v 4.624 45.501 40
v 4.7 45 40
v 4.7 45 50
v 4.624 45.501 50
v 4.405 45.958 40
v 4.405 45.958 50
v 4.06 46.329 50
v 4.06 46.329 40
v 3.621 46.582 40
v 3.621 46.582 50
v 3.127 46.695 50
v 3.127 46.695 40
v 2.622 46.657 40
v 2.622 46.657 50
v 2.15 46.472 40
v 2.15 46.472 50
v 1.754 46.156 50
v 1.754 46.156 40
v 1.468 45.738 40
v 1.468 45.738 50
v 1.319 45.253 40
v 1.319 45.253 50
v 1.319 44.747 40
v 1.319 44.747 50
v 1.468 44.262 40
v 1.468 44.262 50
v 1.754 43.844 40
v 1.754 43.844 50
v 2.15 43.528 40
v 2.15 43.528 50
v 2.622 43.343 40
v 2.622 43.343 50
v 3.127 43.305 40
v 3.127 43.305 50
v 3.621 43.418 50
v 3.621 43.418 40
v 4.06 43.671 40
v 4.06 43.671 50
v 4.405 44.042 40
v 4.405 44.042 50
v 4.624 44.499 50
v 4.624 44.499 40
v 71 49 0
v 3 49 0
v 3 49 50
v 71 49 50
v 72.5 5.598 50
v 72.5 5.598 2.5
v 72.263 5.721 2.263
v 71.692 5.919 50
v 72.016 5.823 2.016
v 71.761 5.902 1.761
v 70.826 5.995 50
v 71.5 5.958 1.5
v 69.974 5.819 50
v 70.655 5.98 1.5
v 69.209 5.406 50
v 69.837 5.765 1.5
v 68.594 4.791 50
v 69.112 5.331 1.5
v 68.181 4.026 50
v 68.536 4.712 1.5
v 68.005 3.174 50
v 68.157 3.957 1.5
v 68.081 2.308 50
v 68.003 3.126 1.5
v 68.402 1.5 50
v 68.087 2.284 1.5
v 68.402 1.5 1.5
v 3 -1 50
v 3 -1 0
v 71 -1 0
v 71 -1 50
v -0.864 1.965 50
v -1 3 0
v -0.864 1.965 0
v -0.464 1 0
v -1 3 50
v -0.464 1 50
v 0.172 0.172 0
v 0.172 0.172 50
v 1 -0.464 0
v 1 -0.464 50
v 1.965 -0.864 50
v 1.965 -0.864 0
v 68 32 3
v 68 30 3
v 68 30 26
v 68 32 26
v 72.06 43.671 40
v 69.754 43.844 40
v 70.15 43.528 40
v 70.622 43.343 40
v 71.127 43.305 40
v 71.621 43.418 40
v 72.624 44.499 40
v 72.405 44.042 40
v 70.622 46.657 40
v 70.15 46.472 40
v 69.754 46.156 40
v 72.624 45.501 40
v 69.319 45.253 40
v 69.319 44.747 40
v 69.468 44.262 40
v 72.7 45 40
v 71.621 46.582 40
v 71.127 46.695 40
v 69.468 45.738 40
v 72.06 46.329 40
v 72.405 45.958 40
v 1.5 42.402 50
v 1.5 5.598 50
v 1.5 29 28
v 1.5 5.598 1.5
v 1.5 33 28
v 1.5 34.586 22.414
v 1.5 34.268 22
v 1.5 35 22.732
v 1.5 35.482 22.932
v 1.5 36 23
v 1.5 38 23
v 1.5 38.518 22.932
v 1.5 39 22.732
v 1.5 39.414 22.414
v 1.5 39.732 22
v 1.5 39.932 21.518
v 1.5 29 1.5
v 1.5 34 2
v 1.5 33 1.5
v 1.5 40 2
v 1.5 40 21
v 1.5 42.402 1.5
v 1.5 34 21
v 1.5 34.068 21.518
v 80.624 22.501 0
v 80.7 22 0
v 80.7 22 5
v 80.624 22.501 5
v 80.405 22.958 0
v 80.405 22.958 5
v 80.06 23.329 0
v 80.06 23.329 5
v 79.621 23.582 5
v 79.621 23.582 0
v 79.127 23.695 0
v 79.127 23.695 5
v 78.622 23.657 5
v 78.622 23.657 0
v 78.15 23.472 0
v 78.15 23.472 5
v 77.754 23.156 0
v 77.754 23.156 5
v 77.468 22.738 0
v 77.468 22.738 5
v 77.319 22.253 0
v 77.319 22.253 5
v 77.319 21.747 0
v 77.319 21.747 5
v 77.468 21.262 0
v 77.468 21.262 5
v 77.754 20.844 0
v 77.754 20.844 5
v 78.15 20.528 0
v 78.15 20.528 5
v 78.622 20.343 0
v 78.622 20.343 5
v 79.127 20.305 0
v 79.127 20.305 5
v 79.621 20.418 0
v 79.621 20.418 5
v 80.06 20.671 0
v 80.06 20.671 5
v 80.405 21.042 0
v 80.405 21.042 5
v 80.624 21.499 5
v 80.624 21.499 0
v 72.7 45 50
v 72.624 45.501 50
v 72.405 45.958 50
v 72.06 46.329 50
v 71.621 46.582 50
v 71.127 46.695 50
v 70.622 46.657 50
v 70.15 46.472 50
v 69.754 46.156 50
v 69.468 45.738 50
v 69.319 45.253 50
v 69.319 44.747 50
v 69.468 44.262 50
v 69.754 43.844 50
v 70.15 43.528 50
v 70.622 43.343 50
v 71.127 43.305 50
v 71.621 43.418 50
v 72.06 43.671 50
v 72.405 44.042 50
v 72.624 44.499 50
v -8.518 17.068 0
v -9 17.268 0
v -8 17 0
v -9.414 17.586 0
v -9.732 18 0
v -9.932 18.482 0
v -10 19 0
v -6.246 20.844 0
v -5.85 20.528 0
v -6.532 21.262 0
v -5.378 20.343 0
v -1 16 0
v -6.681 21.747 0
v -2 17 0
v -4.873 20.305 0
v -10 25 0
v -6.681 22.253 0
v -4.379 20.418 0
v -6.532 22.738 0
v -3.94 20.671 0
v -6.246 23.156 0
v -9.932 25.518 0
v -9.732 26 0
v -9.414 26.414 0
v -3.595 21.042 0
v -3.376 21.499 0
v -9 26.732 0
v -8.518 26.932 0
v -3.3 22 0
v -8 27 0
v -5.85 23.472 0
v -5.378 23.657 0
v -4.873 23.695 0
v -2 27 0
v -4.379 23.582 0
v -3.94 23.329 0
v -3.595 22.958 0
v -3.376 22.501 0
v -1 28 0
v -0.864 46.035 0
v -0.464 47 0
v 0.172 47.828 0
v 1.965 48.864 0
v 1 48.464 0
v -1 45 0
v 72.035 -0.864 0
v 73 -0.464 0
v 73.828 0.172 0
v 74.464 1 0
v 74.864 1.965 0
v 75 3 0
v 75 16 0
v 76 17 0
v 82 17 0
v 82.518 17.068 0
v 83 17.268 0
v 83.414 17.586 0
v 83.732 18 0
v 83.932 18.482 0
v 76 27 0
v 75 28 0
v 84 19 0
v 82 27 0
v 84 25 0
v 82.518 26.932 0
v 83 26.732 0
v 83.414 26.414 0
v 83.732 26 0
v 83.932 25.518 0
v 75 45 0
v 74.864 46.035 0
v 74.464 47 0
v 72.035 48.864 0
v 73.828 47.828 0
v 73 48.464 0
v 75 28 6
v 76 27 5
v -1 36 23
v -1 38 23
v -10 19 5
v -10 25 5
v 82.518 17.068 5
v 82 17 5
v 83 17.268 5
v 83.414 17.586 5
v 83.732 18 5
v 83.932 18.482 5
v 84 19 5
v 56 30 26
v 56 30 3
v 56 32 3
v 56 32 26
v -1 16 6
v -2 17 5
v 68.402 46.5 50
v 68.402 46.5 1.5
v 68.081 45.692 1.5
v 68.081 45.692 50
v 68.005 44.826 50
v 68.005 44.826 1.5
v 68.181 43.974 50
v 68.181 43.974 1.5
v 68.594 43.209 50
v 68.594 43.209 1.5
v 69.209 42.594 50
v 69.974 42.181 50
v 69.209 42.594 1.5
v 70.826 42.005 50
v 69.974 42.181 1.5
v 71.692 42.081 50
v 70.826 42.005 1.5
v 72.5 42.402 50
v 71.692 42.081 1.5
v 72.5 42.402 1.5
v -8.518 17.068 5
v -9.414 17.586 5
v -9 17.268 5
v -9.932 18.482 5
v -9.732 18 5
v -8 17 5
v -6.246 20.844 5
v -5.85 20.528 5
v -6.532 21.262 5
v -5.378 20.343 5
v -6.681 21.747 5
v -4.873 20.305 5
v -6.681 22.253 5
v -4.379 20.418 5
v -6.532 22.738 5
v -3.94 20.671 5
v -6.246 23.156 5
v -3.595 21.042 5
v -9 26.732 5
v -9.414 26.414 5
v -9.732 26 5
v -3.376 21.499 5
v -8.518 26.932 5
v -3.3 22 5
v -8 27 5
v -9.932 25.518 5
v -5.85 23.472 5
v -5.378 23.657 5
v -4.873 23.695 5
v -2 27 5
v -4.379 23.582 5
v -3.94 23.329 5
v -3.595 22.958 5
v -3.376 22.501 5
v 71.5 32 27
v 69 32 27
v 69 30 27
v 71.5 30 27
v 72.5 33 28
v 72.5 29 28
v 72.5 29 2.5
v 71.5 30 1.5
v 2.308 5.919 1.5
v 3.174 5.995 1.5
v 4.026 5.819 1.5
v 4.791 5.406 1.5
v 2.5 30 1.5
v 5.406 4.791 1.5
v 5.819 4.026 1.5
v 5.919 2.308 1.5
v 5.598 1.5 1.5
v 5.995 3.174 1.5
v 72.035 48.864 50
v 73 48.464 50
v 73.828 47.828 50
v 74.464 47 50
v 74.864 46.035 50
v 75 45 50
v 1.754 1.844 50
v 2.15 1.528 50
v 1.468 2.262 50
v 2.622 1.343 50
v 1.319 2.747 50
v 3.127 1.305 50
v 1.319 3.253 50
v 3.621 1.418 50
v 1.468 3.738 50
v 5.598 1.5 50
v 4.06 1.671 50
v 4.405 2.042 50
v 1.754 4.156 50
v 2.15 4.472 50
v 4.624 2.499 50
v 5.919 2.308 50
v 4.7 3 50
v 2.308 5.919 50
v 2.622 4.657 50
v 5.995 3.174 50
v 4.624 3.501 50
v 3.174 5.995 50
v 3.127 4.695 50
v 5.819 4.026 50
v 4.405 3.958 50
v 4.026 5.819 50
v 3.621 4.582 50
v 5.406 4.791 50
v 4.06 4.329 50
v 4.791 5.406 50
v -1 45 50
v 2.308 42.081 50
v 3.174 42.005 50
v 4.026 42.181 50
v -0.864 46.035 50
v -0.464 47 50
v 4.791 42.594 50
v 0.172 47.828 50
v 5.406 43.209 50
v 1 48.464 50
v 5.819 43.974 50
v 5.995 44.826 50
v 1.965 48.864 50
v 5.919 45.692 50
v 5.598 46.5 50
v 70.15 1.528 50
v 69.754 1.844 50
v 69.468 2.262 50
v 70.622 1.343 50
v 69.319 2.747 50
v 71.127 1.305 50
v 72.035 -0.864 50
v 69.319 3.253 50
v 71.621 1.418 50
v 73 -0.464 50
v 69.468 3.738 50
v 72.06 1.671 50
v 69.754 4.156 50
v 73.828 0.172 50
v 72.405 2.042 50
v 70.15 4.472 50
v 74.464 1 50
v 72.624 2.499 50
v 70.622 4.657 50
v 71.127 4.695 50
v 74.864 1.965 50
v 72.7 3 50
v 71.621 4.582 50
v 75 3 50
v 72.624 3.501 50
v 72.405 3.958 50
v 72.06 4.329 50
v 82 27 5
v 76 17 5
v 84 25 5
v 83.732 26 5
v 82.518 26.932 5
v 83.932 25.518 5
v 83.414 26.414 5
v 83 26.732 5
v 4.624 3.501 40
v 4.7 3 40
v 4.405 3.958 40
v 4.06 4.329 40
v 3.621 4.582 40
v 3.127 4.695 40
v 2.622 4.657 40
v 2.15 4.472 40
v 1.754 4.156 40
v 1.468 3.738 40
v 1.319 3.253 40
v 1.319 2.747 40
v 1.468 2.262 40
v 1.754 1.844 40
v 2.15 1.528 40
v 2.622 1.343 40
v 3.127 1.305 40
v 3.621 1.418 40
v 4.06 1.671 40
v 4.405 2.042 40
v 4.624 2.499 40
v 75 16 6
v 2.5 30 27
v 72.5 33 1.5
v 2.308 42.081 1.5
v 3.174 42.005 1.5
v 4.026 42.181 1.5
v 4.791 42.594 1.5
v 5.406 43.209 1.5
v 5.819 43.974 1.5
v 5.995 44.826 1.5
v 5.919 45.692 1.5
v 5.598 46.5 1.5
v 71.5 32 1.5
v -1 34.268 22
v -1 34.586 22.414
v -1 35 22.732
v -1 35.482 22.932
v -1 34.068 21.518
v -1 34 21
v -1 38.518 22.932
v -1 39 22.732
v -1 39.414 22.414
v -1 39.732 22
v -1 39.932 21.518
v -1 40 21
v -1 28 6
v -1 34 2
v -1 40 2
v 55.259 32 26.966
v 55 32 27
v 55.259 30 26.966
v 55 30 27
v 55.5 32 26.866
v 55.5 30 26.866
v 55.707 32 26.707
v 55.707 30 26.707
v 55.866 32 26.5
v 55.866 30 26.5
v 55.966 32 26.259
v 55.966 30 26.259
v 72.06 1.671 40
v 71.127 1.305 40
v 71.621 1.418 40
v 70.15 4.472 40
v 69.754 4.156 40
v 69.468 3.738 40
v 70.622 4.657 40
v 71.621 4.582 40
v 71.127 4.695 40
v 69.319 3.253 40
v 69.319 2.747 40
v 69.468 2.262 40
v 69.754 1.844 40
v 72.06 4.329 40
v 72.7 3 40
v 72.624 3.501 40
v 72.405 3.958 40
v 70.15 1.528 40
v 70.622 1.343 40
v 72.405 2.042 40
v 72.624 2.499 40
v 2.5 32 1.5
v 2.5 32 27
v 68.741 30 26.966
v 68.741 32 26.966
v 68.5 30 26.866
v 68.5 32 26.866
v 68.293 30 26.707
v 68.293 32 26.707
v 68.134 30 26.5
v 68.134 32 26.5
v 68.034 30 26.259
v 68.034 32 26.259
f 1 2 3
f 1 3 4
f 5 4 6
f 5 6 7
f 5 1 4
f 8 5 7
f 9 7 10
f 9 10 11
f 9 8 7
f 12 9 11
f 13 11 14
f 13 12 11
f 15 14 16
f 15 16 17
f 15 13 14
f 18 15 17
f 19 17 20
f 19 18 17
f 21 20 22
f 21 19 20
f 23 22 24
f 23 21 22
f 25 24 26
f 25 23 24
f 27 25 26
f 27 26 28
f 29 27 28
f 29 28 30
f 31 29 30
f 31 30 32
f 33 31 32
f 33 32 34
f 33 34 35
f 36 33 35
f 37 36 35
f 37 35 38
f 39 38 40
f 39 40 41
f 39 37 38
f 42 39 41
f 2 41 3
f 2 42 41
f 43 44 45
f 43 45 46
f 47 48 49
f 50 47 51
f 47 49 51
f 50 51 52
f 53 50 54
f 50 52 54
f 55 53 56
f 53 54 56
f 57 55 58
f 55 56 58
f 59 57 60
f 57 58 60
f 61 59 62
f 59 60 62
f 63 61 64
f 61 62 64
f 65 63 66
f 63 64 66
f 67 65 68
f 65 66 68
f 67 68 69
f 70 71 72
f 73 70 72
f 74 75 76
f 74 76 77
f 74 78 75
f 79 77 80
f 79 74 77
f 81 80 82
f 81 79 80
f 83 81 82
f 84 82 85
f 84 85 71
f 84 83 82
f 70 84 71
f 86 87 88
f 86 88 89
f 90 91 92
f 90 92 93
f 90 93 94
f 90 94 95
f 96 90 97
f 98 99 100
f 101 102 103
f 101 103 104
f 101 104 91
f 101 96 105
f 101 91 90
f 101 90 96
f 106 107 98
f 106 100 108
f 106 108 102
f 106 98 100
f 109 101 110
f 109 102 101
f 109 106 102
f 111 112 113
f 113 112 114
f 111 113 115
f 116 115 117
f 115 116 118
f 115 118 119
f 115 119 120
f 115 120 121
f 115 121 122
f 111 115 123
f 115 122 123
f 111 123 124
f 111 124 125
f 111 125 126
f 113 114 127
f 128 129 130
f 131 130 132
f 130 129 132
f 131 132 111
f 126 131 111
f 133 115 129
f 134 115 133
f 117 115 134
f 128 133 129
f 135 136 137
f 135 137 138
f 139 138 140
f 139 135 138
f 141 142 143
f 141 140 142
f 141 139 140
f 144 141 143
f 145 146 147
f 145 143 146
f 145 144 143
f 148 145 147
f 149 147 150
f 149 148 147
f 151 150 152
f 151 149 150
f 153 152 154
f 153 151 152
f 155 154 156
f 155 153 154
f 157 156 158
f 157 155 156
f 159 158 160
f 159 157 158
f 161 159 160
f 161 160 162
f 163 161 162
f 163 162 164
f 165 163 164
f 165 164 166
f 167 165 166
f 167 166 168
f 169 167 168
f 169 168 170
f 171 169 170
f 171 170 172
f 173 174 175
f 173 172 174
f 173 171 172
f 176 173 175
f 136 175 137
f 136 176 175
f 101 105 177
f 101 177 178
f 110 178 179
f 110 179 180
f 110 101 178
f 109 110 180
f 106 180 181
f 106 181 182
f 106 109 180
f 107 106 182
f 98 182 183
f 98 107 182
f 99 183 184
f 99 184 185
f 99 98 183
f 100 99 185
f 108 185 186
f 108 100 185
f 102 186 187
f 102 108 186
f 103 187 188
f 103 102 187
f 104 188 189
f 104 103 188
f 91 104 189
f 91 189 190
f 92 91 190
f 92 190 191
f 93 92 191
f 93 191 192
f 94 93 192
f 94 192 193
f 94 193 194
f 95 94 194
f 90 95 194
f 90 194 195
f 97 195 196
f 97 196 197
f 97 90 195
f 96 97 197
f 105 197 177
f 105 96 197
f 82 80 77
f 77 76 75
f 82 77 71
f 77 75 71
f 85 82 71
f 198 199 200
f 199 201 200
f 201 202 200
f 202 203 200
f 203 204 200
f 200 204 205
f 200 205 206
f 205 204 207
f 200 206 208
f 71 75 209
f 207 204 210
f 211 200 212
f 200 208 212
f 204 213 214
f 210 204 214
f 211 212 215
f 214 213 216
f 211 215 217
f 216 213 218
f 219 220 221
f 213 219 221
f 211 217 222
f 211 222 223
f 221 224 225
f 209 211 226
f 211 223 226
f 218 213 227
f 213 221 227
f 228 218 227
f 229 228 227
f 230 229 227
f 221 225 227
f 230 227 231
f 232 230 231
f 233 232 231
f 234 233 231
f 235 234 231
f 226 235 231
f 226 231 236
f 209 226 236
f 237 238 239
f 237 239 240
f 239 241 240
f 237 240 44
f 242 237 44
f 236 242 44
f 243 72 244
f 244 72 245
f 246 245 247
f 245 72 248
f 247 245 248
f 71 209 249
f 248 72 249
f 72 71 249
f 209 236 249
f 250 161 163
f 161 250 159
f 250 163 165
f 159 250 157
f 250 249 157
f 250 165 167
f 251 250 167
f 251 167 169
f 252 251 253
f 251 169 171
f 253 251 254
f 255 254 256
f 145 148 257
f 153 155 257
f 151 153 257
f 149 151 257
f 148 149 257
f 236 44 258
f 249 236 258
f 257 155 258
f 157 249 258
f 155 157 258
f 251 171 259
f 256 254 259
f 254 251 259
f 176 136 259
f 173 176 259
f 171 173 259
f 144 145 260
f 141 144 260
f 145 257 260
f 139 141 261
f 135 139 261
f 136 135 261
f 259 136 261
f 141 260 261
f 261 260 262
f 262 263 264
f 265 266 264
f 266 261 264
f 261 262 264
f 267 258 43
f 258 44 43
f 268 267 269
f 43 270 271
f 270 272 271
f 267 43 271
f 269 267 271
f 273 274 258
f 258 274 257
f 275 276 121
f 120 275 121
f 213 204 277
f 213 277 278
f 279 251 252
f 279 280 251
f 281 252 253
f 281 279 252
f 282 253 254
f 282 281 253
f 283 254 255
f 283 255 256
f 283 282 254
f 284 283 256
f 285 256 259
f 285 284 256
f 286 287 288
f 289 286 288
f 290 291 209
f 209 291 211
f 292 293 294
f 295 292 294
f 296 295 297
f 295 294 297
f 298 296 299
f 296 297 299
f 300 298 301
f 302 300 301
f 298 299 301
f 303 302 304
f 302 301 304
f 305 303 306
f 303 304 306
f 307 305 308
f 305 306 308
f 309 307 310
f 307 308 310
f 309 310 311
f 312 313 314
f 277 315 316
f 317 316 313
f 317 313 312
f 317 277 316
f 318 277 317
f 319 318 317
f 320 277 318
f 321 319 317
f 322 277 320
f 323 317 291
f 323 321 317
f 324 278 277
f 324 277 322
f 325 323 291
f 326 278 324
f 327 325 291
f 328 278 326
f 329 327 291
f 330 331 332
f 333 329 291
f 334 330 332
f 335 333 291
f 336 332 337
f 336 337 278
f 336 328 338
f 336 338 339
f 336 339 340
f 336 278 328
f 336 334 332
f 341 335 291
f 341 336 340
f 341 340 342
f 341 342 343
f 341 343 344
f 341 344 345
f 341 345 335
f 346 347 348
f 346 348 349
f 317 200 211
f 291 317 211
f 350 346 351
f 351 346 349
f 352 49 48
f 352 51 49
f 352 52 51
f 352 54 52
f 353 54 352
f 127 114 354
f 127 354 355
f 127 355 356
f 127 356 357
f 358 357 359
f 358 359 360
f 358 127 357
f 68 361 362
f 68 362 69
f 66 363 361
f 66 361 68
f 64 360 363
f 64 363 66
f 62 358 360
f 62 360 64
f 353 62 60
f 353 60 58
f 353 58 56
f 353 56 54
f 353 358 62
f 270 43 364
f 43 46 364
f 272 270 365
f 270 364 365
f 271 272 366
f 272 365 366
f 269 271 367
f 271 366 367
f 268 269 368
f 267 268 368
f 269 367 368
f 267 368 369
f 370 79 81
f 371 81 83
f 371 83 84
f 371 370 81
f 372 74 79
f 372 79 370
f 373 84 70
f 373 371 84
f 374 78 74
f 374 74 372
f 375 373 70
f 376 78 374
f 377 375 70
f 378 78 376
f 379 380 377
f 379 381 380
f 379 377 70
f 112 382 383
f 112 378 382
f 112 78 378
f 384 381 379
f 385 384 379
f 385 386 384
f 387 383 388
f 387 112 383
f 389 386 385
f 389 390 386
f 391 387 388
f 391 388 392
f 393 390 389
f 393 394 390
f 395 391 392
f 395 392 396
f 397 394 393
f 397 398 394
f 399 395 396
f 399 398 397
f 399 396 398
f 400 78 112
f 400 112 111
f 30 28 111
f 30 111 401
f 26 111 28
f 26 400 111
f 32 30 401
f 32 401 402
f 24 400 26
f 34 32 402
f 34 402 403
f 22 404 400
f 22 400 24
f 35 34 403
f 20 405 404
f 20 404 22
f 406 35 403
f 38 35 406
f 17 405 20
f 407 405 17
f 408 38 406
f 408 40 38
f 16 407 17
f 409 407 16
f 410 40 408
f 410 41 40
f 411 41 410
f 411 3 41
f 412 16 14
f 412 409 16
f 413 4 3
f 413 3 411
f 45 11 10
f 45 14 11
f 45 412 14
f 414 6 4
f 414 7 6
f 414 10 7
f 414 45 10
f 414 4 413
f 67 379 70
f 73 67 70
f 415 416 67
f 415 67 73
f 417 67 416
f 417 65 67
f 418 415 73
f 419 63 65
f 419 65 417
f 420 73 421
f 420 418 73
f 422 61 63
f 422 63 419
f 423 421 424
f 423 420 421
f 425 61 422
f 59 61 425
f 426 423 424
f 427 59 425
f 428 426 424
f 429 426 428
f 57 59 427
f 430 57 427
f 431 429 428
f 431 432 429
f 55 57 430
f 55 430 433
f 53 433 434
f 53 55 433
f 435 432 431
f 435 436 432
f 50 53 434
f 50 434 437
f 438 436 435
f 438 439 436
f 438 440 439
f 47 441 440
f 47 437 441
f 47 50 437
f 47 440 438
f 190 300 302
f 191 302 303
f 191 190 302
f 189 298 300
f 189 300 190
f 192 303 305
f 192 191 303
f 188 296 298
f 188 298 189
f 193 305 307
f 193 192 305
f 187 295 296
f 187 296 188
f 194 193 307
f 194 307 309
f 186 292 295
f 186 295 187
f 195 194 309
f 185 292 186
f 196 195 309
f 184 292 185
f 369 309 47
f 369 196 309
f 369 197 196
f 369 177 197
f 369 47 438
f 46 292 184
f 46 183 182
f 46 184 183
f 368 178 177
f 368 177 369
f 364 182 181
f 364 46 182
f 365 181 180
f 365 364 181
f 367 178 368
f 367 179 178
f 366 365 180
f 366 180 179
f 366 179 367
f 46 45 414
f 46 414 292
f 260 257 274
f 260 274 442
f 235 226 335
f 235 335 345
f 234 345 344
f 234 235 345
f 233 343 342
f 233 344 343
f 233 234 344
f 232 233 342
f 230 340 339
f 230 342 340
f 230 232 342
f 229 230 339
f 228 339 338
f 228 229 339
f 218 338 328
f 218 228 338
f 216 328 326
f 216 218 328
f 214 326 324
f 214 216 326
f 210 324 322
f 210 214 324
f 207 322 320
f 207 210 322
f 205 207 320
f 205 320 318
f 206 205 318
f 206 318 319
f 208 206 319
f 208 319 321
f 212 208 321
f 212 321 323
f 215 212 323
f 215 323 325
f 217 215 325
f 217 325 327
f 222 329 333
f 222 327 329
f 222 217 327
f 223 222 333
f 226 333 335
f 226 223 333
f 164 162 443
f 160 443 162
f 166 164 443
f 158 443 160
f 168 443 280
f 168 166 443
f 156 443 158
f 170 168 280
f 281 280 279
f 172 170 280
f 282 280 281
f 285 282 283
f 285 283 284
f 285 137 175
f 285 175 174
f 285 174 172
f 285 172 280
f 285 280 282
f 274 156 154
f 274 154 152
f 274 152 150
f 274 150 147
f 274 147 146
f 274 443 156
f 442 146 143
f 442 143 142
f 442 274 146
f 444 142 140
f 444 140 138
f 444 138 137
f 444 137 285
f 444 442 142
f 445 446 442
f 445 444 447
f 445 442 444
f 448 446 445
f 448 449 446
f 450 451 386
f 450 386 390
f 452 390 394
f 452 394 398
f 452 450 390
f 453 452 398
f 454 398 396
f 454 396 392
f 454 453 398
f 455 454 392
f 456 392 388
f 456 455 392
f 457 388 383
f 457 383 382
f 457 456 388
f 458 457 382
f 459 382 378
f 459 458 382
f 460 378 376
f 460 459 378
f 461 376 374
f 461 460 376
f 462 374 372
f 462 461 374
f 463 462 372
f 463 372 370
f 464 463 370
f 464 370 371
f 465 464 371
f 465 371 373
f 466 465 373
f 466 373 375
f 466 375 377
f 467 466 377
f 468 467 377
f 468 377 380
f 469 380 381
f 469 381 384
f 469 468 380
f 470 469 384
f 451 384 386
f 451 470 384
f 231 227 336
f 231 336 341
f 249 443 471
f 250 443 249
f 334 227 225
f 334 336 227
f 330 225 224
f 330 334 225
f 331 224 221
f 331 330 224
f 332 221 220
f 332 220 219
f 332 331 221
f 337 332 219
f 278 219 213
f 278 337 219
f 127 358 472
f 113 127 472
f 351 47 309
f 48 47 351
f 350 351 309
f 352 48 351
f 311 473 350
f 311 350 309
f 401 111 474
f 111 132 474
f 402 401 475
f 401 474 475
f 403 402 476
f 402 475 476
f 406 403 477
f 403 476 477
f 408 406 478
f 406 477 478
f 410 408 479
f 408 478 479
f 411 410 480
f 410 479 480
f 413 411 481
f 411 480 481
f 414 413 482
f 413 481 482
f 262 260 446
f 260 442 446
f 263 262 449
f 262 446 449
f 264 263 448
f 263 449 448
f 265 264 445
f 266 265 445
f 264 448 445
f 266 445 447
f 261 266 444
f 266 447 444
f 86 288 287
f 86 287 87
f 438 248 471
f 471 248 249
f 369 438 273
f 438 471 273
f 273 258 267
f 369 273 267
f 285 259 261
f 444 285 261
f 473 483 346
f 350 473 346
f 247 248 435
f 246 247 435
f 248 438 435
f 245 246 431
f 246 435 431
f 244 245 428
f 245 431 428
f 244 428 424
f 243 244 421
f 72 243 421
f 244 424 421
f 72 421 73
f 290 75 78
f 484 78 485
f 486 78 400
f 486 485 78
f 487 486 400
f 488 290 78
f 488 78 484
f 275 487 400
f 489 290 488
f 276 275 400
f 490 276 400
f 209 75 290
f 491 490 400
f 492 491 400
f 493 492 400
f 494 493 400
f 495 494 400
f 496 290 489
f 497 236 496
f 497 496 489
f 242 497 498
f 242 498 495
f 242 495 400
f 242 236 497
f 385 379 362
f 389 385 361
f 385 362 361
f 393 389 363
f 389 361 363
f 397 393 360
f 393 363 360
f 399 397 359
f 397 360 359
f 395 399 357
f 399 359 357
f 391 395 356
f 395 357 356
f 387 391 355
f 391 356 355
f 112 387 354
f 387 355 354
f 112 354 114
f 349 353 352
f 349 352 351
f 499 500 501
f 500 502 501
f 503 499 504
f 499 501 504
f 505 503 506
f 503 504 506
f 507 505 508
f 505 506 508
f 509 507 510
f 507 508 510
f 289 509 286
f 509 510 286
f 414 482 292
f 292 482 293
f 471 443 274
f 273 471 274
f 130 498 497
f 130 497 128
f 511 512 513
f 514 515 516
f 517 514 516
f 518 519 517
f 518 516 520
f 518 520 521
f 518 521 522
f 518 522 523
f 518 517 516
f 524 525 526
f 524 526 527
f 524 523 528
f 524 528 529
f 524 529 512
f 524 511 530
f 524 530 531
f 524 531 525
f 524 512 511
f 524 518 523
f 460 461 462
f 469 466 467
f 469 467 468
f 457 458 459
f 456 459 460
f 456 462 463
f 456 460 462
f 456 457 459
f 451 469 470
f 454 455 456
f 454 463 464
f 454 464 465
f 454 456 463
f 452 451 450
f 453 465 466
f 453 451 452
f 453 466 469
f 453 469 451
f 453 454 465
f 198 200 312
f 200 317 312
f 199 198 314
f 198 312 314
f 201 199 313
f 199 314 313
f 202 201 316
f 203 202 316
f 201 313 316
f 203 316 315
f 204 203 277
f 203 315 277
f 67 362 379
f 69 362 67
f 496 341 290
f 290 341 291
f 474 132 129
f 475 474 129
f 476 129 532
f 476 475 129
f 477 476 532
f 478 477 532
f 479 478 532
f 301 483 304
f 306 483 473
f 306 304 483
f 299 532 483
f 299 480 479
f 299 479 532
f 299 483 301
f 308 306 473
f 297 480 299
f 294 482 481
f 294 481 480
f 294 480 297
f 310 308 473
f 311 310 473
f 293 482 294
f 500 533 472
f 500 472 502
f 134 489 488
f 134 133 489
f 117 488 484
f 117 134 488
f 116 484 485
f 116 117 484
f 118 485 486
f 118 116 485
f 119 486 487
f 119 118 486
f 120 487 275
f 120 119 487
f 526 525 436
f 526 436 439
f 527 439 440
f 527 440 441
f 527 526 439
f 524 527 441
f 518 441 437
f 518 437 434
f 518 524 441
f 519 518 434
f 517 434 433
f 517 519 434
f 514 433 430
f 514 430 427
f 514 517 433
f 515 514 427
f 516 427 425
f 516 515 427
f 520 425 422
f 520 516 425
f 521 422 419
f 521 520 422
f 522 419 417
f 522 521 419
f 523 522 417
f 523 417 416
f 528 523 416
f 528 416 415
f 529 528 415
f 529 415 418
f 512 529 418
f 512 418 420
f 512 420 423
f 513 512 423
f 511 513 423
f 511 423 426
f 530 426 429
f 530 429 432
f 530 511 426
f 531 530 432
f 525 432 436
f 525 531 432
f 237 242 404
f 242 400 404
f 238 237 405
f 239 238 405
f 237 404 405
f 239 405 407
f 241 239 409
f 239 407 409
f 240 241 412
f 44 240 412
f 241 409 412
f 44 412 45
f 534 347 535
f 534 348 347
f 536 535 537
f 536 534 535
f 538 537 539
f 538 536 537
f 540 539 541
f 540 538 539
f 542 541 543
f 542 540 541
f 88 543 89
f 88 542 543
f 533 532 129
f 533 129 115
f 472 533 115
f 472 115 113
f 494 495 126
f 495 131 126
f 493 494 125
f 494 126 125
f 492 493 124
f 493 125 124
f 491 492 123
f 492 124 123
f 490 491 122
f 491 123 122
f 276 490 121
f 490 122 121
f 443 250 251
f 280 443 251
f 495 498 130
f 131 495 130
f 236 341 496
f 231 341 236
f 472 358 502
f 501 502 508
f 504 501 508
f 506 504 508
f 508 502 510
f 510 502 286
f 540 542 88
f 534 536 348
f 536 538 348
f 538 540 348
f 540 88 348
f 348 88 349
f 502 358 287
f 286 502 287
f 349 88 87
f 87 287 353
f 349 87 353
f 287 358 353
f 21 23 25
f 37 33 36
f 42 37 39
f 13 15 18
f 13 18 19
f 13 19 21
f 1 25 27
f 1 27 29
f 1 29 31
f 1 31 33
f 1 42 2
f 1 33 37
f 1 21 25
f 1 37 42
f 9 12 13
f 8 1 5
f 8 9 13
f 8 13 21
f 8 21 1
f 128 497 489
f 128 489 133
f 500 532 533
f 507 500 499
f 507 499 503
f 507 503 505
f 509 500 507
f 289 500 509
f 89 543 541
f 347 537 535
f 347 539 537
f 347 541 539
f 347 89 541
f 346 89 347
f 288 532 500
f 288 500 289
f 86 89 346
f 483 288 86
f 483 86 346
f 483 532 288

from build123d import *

# Parameters (mm, degrees)
BOX003_W          = 6
BOX003_H          = 6
BOX003_DEPTH      = 21
BOX004_W          = 12
BOX004_H          = 5
BOX004_DEPTH      = 27
CYLINDER003_R     = 1.7
CYLINDER003_DEPTH = 10
CYLINDER005_R     = 1.7
CYLINDER005_DEPTH = 10
CYLINDER007_R     = 1.7
CYLINDER007_DEPTH = 10
CYLINDER001_R     = 1.7
CYLINDER001_DEPTH = 10
BOX001_W          = 71
BOX001_H          = 45
BOX001_DEPTH      = 50
BOX_W             = 76
BOX_H             = 50
BOX_DEPTH         = 50
CYLINDER009_R     = 1.7
CYLINDER009_DEPTH = 10
BOX006_W          = 10
BOX006_H          = 10
BOX006_DEPTH      = 5
CYLINDER008_R     = 1.7
CYLINDER008_DEPTH = 10
BOX005_W          = 10
BOX005_H          = 10
BOX005_DEPTH      = 5
CYLINDER002_R     = 3
CYLINDER002_DEPTH = 50
CYLINDER004_R     = 3
CYLINDER004_DEPTH = 50
CYLINDER006_R     = 3
CYLINDER006_DEPTH = 50
CYLINDER_R        = 3
CYLINDER_DEPTH    = 50
BOX002_W          = 74
BOX002_H          = 2
BOX002_DEPTH      = 27
CHAMFER_SIZE      = 1
CHAMFER002_SIZE   = 1
FILLET_R          = 4
CHAMFER003_SIZE   = 1
FILLET007_1_R     = 2
FILLET007_2_R     = 1


with BuildPart() as entrada_alimentacion:
    # Box003 → Box003 (new body)
    with BuildSketch(Plane(origin=(-3, 34, 2), x_dir=(1, 0, 0), z_dir=(0, 0, 1))):
        with Locations((3, 3)):
            Rectangle(BOX003_W, BOX003_H)
    extrude(amount=BOX003_DEPTH)


with BuildPart() as salida_alimentacion_para_esp:
    # Box004 → Box004 (new body)
    with BuildSketch(Plane(origin=(56, 28, 3), x_dir=(1, 0, 0), z_dir=(0, 0, 1))):
        with Locations((6, 2.5)):
            Rectangle(BOX004_W, BOX004_H)
    extrude(amount=BOX004_DEPTH)


with BuildPart() as orificio_tornillo001:
    # Cylinder003 → Cylinder003 (new body)
    with BuildSketch(Plane(origin=(71, 3, 40), x_dir=(1, 0, 0), z_dir=(0, 0, 1))):
        Circle(CYLINDER003_R)
    extrude(amount=CYLINDER003_DEPTH)


with BuildPart() as orificio_tornillo002:
    # Cylinder005 → Cylinder005 (new body)
    with BuildSketch(Plane(origin=(3, 45, 40), x_dir=(1, 0, 0), z_dir=(0, 0, 1))):
        Circle(CYLINDER005_R)
    extrude(amount=CYLINDER005_DEPTH)


with BuildPart() as orificio_tornillo003:
    # Cylinder007 → Cylinder007 (new body)
    with BuildSketch(Plane(origin=(71, 45, 40), x_dir=(1, 0, 0), z_dir=(0, 0, 1))):
        Circle(CYLINDER007_R)
    extrude(amount=CYLINDER007_DEPTH)


with BuildPart() as orificions_tornillos:
    # Cylinder001 → Cylinder001 (new body)
    with BuildSketch(Plane(origin=(3, 3, 40), x_dir=(1, 0, 0), z_dir=(0, 0, 1))):
        Circle(CYLINDER001_R)
    extrude(amount=CYLINDER001_DEPTH)

    # Fusion003: union orificio tornillo001, orificio tornillo002, orificio tornillo003
    add(orificio_tornillo001.part)
    add(orificio_tornillo002.part)
    add(orificio_tornillo003.part)


with BuildPart() as vaciado_interior:
    # Box001 → Box001 (new body)
    with BuildSketch(Plane(origin=(1.5, 1.5, 1.5), x_dir=(1, 0, 0), z_dir=(0, 0, 1))):
        with Locations((35.5, 22.5)):
            Rectangle(BOX001_W, BOX001_H)
    extrude(amount=BOX001_DEPTH)


with BuildPart() as parte_inferior:
    # Box → Box (new body)
    with BuildSketch(Plane(origin=(-1, -1, 0), x_dir=(1, 0, 0), z_dir=(0, 0, 1))):
        with Locations((38, 25)):
            Rectangle(BOX_W, BOX_H)
    extrude(amount=BOX_DEPTH)

    # Cut: cut vaciado interior
    add(vaciado_interior.part, mode=Mode.SUBTRACT)


with BuildPart() as orificio_soporte_exterior001:
    # Cylinder009 → Cylinder009 (new body)
    with BuildSketch(Plane(origin=(-5, 22, -1), x_dir=(1, 0, 0), z_dir=(0, 0, 1))):
        Circle(CYLINDER009_R)
    extrude(amount=CYLINDER009_DEPTH)


with BuildPart() as cut002:
    # Box006 → Box006 (new body)
    with BuildSketch(Plane(origin=(-10, 17, 0), x_dir=(1, 0, 0), z_dir=(0, 0, 1))):
        with Locations((5, 5)):
            Rectangle(BOX006_W, BOX006_H)
    extrude(amount=BOX006_DEPTH)

    # Cut002: cut orificio soporte exterior001
    add(orificio_soporte_exterior001.part, mode=Mode.SUBTRACT)


with BuildPart() as cut002_1:
    # Cut002 placement: moved
    add(cut002.part.moved(Location((84, 0, 0))))


with BuildPart() as orificio_soporte_exterior:
    # Cylinder008 → Cylinder008 (new body)
    with BuildSketch(Plane(origin=(-5, 22, -1), x_dir=(1, 0, 0), z_dir=(0, 0, 1))):
        Circle(CYLINDER008_R)
    extrude(amount=CYLINDER008_DEPTH)


with BuildPart() as soportes_exteriores:
    # Box005 → Box005 (new body)
    with BuildSketch(Plane(origin=(-10, 17, 0), x_dir=(1, 0, 0), z_dir=(0, 0, 1))):
        with Locations((5, 5)):
            Rectangle(BOX005_W, BOX005_H)
    extrude(amount=BOX005_DEPTH)

    # Cut001: cut orificio soporte exterior
    add(orificio_soporte_exterior.part, mode=Mode.SUBTRACT)

    # Fusion: union Cut002
    add(cut002_1.part)


with BuildPart() as soporte_tornillo001:
    # Cylinder002 → Cylinder002 (new body)
    with BuildSketch(Plane(origin=(71, 3, 0), x_dir=(1, 0, 0), z_dir=(0, 0, 1))):
        Circle(CYLINDER002_R)
    extrude(amount=CYLINDER002_DEPTH)


with BuildPart() as soporte_tornillo002:
    # Cylinder004 → Cylinder004 (new body)
    with BuildSketch(Plane(origin=(3, 45, 0), x_dir=(1, 0, 0), z_dir=(0, 0, 1))):
        Circle(CYLINDER004_R)
    extrude(amount=CYLINDER004_DEPTH)


with BuildPart() as soporte_tornillo003:
    # Cylinder006 → Cylinder006 (new body)
    with BuildSketch(Plane(origin=(71, 45, 0), x_dir=(1, 0, 0), z_dir=(0, 0, 1))):
        Circle(CYLINDER006_R)
    extrude(amount=CYLINDER006_DEPTH)


with BuildPart() as soportes_tornillos:
    # Cylinder → Cylinder (new body)
    with BuildSketch(Plane(origin=(3, 3, 0), x_dir=(1, 0, 0), z_dir=(0, 0, 1))):
        Circle(CYLINDER_R)
    extrude(amount=CYLINDER_DEPTH)

    # Fusion001: union soporte tornillo001, soporte tornillo002, soporte tornillo003
    add(soporte_tornillo001.part)
    add(soporte_tornillo002.part)
    add(soporte_tornillo003.part)


with BuildPart() as parte_inferior001:
    # Box002 → Box002 (new body)
    with BuildSketch(Plane(origin=(0, 30, 0), x_dir=(1, 0, 0), z_dir=(0, 0, 1))):
        with Locations((37, 1)):
            Rectangle(BOX002_W, BOX002_H)
    extrude(amount=BOX002_DEPTH)

    # Fusion002: union parte inferior, soportes exteriores, soportes tornillos
    add(parte_inferior.part)
    add(soportes_exteriores.part)
    add(soportes_tornillos.part)

    # Cut003: cut orificions tornillos
    add(orificions_tornillos.part, mode=Mode.SUBTRACT)

    # Cut004: cut salida alimentacion para esp
    add(salida_alimentacion_para_esp.part, mode=Mode.SUBTRACT)

    # Cut005: cut entrada alimentacion
    add(entrada_alimentacion.part, mode=Mode.SUBTRACT)

    # Chamfer
    chamfer_edges = [parte_inferior001.edges().sort_by_distance(p)[0] for p in [
        (72.5, 17.799038, 1.5),
    ]]
    chamfer(chamfer_edges, length=CHAMFER_SIZE)

    # Chamfer002
    chamfer002_edges = [parte_inferior001.edges().sort_by_distance(p)[0] for p in [
        (-1, 27, 2.5),
    ]]
    chamfer(chamfer002_edges, length=CHAMFER002_SIZE)

    # Fillet
    fillet_edges = [parte_inferior001.edges().sort_by_distance(p)[0] for p in [
        (-1, 49, 25),
        (-1, -1, 25),
        (75, 49, 25),
        (75, -1, 25),
    ]]
    fillet(fillet_edges, radius=FILLET_R)

    # Chamfer003
    chamfer003_edges = [parte_inferior001.edges().sort_by_distance(p)[0] for p in [
        (-1, 22, 5),
        (-1, 17, 2.5),
        (75, 17, 2.5),
        (75, 27, 2.5),
        (75, 22, 5),
        (72.5, 30, 14.75),
        (72.5, 31, 27),
        (72.5, 32, 14.25),
        (1.5, 30, 14.25),
        (1.5, 31, 27),
        (1.5, 32, 14.25),
    ]]
    chamfer(chamfer003_edges, length=CHAMFER003_SIZE)

    # Fillet007 1
    fillet007_1_edges = [parte_inferior001.edges().sort_by_distance(p)[0] for p in [
        (0.25, 40, 23),
        (0.25, 34, 23),
        (84, 27, 2.5),
        (84, 17, 2.5),
        (-10, 27, 2.5),
        (-10, 17, 2.5),
    ]]
    fillet(fillet007_1_edges, radius=FILLET007_1_R)

    # Fillet007 2
    fillet007_2_edges = [parte_inferior001.edges().sort_by_distance(p)[0] for p in [
        (68, 31, 27),
        (56, 31, 27),
    ]]
    fillet(fillet007_2_edges, radius=FILLET007_2_R)


solid = parte_inferior001.part
